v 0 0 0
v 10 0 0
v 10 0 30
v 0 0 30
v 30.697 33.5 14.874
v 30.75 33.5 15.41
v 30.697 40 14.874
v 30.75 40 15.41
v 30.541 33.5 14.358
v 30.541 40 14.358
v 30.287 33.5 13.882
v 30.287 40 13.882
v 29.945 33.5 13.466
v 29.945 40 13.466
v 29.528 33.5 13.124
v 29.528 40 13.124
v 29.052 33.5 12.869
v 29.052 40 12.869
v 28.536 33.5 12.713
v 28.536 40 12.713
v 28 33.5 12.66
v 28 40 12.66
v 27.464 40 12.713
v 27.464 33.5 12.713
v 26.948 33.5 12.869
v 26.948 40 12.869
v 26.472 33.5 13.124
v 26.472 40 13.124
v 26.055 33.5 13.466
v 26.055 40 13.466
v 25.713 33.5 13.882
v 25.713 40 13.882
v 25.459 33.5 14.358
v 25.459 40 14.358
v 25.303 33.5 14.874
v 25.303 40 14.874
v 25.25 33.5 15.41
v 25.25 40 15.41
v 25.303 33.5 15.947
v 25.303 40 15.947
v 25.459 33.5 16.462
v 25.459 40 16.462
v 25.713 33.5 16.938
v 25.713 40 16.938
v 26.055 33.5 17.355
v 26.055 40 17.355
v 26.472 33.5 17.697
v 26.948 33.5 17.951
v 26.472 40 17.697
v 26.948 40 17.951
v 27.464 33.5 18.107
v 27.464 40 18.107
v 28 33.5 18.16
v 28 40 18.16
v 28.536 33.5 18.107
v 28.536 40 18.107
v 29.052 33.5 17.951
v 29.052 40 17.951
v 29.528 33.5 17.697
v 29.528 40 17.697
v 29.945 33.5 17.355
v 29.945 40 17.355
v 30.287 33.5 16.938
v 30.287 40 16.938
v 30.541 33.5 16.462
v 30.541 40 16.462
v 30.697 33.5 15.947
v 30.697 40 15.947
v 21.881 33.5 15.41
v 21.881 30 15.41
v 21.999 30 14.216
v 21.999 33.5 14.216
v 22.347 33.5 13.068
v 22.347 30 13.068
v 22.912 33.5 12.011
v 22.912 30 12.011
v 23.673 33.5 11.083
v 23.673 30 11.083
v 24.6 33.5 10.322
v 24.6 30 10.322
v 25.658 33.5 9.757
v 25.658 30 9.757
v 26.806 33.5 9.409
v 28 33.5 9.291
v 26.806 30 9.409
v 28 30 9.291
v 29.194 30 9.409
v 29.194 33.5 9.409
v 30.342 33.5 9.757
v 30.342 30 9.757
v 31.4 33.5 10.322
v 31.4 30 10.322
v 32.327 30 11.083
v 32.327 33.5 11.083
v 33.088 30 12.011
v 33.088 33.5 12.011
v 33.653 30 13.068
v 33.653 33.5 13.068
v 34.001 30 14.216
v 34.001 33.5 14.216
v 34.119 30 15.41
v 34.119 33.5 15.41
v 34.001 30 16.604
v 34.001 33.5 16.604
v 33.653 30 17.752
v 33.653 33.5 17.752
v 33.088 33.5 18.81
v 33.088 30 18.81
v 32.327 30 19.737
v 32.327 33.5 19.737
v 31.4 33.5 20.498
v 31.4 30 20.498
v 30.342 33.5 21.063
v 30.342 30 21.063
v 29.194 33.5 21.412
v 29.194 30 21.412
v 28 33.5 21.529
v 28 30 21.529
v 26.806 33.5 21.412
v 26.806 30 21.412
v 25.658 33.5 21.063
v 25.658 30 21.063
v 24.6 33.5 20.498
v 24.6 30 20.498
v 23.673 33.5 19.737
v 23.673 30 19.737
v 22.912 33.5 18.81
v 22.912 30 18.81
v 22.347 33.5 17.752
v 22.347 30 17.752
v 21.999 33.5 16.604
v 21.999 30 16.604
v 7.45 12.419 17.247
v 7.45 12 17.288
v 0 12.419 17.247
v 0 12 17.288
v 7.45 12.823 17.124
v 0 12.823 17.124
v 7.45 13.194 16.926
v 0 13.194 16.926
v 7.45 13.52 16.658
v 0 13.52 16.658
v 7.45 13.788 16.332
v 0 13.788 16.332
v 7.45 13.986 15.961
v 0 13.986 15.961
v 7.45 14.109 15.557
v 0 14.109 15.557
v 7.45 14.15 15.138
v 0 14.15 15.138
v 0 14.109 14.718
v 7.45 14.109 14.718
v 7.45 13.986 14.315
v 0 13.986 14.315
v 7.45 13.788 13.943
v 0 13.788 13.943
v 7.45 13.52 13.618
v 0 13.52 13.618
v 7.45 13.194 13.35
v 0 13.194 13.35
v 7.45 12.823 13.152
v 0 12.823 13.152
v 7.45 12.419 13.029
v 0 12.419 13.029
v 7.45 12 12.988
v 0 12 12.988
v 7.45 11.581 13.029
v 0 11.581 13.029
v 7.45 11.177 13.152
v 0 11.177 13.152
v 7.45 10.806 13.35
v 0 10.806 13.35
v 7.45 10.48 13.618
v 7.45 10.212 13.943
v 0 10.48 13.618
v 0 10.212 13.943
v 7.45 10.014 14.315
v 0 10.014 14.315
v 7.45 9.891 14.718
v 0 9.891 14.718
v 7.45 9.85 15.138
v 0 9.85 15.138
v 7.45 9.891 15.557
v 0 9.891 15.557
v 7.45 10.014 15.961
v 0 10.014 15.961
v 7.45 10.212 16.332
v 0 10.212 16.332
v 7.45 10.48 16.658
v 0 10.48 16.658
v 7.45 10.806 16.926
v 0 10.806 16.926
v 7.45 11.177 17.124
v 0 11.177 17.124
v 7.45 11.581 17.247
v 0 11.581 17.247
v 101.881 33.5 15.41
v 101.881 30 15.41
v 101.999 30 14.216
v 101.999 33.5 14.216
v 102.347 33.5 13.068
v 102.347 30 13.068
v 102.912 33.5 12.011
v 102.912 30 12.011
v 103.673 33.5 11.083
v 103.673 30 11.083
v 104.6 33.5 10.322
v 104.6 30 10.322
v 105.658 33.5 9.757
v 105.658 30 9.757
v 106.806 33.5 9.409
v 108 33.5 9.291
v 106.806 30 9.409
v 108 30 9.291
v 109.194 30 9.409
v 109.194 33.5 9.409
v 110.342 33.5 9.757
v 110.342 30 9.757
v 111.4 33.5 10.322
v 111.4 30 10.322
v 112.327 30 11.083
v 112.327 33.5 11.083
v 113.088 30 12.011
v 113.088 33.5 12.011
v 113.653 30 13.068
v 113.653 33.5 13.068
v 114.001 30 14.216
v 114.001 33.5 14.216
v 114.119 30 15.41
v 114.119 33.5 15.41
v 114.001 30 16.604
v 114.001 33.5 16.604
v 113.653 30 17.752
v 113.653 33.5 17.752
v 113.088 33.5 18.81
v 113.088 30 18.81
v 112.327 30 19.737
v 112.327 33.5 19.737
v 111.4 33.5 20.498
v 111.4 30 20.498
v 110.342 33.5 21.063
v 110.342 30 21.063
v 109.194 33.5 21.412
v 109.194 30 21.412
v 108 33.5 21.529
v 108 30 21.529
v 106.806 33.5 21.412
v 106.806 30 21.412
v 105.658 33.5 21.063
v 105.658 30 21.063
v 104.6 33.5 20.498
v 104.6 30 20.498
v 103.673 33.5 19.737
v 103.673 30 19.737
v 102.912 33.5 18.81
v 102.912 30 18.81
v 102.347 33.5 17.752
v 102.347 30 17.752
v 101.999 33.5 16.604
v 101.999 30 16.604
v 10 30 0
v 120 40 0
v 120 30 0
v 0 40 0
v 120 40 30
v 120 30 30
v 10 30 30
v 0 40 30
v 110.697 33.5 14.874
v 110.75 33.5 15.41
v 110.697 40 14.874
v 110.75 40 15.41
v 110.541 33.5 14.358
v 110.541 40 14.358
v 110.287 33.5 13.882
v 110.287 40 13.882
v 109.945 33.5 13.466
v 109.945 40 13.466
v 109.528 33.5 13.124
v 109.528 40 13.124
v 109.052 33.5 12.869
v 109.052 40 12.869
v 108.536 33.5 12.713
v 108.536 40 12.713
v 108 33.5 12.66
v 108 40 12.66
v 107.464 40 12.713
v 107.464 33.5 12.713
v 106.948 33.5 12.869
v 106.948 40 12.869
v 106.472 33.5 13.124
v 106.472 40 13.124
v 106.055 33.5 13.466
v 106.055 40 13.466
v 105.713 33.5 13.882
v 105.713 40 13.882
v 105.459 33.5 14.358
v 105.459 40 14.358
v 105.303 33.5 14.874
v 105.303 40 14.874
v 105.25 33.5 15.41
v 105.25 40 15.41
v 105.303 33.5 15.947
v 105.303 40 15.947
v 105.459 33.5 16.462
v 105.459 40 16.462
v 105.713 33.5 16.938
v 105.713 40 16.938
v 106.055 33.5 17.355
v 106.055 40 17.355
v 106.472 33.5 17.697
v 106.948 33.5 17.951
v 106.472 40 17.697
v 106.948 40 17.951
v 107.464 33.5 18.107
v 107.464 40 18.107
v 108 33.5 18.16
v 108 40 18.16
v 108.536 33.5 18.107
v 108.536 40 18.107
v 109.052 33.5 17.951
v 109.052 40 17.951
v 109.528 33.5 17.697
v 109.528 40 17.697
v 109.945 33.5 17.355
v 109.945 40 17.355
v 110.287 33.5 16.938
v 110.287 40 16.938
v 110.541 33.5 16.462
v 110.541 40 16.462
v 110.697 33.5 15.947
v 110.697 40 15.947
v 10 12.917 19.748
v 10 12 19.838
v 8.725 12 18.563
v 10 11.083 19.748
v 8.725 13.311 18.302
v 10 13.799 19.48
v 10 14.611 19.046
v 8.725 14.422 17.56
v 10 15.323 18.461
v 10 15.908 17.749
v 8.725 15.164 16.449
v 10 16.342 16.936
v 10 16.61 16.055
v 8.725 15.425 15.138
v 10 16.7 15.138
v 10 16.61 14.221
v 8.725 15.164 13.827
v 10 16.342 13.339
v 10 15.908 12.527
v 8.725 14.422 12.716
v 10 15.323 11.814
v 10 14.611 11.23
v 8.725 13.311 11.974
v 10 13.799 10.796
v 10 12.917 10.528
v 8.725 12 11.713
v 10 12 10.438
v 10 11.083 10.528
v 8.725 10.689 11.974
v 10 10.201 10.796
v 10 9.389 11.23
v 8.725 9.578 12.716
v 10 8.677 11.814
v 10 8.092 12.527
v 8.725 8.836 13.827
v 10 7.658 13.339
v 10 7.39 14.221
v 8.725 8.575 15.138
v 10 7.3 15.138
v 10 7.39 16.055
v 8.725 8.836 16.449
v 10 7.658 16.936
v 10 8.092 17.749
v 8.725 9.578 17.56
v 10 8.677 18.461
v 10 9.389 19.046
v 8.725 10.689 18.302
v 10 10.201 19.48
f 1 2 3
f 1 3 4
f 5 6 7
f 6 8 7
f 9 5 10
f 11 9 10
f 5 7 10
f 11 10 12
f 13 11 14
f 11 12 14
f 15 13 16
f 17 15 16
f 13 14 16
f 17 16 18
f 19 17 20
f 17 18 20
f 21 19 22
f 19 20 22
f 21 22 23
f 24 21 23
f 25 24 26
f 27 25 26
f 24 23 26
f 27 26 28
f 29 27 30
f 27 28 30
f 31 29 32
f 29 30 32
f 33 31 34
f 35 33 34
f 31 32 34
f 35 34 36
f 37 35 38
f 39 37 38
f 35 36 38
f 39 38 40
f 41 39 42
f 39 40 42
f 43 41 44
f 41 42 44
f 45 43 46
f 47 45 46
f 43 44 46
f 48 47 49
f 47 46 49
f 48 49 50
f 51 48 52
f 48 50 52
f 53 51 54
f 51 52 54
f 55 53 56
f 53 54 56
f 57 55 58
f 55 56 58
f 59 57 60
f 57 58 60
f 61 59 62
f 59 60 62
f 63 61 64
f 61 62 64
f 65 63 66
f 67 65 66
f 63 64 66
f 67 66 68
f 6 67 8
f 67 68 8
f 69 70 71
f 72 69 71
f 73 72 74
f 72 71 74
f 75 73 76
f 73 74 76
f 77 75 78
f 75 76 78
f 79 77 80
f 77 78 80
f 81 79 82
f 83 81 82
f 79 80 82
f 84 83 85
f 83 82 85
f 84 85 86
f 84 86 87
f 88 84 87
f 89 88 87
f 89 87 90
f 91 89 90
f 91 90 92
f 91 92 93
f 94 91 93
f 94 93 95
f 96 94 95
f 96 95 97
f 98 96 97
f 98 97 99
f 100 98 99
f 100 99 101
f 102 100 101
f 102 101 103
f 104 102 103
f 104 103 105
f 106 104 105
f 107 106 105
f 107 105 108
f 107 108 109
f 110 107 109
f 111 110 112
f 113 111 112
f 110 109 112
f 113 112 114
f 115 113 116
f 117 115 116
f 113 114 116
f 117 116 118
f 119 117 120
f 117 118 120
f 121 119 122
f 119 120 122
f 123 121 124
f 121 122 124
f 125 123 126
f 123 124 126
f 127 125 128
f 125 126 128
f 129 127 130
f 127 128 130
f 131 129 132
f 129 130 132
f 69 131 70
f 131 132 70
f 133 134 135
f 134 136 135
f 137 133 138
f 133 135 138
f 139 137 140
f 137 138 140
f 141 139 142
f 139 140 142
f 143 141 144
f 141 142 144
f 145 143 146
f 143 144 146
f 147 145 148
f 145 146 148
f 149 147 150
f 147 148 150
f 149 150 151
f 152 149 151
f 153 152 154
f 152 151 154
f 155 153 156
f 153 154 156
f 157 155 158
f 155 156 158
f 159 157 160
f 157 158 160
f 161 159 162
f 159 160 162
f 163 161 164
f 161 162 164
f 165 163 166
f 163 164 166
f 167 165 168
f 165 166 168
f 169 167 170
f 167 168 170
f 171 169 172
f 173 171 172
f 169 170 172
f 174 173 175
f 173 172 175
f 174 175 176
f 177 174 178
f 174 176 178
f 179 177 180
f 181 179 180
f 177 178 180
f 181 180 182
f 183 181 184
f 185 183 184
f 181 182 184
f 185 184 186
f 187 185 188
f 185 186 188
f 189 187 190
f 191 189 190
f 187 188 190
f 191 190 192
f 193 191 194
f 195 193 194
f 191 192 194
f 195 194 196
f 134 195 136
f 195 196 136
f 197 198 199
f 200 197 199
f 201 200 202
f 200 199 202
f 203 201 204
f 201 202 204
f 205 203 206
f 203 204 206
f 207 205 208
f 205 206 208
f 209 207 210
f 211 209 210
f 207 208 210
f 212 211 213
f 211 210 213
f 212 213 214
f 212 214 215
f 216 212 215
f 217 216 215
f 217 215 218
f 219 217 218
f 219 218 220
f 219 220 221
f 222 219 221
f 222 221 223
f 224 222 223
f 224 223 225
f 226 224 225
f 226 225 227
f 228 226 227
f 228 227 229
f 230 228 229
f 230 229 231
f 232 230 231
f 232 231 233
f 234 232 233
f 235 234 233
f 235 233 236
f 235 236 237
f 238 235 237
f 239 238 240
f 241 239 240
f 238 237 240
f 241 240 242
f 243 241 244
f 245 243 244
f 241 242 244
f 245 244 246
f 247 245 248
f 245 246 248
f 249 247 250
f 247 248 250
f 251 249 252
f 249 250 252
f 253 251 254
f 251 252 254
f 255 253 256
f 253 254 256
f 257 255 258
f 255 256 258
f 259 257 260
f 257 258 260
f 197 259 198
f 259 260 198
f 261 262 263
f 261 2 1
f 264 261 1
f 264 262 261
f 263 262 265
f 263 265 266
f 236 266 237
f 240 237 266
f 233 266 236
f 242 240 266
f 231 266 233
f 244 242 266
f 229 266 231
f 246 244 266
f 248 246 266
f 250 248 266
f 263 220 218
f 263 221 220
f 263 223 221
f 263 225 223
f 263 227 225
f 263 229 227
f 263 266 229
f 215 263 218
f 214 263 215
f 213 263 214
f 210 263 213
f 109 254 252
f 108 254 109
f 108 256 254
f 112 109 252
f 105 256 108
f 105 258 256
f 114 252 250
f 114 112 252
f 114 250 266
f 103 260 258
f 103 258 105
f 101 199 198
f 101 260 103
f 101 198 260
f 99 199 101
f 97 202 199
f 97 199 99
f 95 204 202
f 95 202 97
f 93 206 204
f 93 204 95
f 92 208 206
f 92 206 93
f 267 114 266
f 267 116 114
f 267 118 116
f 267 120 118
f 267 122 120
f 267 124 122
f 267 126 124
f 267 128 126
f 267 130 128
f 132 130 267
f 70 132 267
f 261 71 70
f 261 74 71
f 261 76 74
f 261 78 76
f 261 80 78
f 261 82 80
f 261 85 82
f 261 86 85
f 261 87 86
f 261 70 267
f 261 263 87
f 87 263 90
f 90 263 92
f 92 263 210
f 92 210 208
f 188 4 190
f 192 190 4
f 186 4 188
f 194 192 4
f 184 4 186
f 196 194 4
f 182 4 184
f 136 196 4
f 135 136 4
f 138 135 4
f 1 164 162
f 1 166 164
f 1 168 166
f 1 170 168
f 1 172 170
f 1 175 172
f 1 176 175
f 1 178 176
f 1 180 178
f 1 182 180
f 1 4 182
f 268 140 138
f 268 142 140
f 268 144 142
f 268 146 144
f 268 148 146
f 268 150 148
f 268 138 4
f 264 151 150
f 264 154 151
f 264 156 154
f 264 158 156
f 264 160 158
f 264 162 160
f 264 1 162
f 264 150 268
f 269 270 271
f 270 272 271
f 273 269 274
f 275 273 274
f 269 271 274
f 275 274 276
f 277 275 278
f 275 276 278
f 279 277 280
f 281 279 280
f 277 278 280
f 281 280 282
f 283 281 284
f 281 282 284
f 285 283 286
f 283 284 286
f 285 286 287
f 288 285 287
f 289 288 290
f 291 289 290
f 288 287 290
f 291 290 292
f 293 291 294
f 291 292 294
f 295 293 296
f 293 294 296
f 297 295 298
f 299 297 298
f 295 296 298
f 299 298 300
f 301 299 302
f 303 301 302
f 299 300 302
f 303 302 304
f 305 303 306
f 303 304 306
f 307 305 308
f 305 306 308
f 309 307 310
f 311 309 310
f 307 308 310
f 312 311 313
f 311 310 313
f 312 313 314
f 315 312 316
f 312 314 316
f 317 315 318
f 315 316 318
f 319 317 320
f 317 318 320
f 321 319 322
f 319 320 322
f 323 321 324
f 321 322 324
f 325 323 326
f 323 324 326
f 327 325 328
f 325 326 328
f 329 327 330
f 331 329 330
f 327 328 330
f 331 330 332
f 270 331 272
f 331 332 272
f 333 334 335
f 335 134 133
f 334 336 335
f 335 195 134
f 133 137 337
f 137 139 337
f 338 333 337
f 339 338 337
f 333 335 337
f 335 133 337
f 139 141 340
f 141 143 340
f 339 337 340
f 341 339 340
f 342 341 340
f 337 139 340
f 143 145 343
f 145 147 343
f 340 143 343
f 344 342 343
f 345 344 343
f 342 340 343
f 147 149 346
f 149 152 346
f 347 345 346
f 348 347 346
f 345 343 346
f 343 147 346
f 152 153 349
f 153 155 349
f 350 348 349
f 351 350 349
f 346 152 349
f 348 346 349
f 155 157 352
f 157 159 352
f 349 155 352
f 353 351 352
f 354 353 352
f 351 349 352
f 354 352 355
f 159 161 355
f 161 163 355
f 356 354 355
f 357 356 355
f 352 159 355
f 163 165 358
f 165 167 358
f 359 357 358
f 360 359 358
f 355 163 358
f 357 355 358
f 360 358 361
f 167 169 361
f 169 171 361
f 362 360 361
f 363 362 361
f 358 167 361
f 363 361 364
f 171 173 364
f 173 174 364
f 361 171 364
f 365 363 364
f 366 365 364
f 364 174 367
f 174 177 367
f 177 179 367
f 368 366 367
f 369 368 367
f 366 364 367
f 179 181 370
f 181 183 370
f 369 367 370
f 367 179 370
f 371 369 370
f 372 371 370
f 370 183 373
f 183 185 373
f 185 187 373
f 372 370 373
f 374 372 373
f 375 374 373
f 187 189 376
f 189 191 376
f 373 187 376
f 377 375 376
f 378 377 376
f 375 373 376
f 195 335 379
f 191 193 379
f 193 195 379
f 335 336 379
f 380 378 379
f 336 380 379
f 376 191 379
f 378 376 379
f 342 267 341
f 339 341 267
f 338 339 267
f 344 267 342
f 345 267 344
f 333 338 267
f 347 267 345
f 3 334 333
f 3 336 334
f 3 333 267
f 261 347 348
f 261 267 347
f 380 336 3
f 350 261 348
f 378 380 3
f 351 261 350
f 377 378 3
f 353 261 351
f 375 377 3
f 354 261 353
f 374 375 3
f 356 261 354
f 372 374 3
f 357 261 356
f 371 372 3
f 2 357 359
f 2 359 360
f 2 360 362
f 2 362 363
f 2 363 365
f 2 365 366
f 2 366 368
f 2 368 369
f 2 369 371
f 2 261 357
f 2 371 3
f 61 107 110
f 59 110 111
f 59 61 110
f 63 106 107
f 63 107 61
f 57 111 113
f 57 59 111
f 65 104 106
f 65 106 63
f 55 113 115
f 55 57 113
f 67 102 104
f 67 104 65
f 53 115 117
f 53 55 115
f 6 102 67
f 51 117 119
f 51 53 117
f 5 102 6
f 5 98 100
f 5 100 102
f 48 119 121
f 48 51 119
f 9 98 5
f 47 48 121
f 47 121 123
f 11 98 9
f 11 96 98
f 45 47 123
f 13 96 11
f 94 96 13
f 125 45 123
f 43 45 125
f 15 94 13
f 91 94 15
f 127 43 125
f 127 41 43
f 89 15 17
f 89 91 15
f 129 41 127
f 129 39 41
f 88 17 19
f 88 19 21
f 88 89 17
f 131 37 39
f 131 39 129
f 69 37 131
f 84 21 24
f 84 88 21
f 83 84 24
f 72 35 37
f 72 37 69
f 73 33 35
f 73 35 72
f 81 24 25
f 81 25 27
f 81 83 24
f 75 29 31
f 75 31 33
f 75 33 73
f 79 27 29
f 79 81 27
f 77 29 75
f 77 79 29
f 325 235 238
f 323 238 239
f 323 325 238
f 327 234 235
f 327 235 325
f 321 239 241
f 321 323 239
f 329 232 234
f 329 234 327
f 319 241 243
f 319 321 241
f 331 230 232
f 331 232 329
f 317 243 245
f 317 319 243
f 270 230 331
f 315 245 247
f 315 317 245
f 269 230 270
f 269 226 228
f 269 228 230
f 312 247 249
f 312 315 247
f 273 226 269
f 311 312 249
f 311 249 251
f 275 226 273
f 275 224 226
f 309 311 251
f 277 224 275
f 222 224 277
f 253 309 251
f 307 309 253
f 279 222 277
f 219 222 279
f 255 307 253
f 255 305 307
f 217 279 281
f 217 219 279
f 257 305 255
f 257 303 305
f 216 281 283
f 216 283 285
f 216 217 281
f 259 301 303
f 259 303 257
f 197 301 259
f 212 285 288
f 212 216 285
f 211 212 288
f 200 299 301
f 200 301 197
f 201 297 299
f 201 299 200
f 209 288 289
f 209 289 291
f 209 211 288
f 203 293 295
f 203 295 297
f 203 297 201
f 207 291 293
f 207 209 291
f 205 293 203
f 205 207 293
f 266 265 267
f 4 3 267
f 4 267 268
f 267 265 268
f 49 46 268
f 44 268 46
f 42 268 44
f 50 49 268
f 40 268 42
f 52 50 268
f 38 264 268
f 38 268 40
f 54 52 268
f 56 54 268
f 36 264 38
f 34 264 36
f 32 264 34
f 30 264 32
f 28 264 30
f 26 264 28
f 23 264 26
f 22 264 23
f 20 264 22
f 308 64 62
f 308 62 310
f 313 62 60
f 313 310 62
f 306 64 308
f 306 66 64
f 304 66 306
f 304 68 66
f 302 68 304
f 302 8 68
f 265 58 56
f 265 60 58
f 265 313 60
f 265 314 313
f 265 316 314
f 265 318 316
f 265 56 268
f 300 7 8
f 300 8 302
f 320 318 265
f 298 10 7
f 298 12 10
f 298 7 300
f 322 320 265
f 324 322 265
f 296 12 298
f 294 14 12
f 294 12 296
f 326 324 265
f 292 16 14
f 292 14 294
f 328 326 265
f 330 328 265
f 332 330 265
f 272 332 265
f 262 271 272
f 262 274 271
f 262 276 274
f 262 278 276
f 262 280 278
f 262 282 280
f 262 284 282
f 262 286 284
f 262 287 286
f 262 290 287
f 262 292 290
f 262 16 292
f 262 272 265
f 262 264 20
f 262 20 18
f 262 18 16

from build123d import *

# Parameters (mm, degrees)
BOSS_EXTRUDE1_DEPTH                                  = 30
CBORE_FOR_M5_HEX_HEAD_BOLT1_D                        = 5.5
CBORE_FOR_M5_HEX_HEAD_BOLT1_CBORE_D                  = 12.238
CBORE_FOR_M5_HEX_HEAD_BOLT1_CBORE_DEPTH              = 3.5
CSK_FOR_M4_COUNTERSUNK_RAISED_HEAD_SCREW_D           = 4.3
CSK_FOR_M4_COUNTERSUNK_RAISED_HEAD_SCREW_CSINK_D     = 9.4
CSK_FOR_M4_COUNTERSUNK_RAISED_HEAD_SCREW_CSINK_ANGLE = 90


with BuildPart() as part:
    # Sketch1 → Boss-Extrude1 (new body)
    with BuildSketch(Plane.XY):
        Polygon((0, 0), (0, 40), (120, 40), (120, 30), (10, 30), (10, 0), align=None)
    extrude(amount=BOSS_EXTRUDE1_DEPTH)

    # CBORE for M5 Hex Head Bolt1 (through all)
    with Locations(Plane(origin=(0, 30, 0), x_dir=(-1, 0, 0), z_dir=(0, -1, 0))):
        with Locations((-108, -15.41009868), (-28, -15.41009868)):
            CounterBoreHole(CBORE_FOR_M5_HEX_HEAD_BOLT1_D / 2, CBORE_FOR_M5_HEX_HEAD_BOLT1_CBORE_D / 2, CBORE_FOR_M5_HEX_HEAD_BOLT1_CBORE_DEPTH)

    # CSK for M4 Countersunk Raised Head Screw1 (through all)
    with Locations(Plane(origin=(10, 0, 0), x_dir=(0, 0, -1), z_dir=(1, 0, 0))):
        with Locations((-15.137848296, 12)):
            CounterSinkHole(CSK_FOR_M4_COUNTERSUNK_RAISED_HEAD_SCREW_D / 2, CSK_FOR_M4_COUNTERSUNK_RAISED_HEAD_SCREW_CSINK_D / 2, counter_sink_angle=CSK_FOR_M4_COUNTERSUNK_RAISED_HEAD_SCREW_CSINK_ANGLE)


solid = part.part
